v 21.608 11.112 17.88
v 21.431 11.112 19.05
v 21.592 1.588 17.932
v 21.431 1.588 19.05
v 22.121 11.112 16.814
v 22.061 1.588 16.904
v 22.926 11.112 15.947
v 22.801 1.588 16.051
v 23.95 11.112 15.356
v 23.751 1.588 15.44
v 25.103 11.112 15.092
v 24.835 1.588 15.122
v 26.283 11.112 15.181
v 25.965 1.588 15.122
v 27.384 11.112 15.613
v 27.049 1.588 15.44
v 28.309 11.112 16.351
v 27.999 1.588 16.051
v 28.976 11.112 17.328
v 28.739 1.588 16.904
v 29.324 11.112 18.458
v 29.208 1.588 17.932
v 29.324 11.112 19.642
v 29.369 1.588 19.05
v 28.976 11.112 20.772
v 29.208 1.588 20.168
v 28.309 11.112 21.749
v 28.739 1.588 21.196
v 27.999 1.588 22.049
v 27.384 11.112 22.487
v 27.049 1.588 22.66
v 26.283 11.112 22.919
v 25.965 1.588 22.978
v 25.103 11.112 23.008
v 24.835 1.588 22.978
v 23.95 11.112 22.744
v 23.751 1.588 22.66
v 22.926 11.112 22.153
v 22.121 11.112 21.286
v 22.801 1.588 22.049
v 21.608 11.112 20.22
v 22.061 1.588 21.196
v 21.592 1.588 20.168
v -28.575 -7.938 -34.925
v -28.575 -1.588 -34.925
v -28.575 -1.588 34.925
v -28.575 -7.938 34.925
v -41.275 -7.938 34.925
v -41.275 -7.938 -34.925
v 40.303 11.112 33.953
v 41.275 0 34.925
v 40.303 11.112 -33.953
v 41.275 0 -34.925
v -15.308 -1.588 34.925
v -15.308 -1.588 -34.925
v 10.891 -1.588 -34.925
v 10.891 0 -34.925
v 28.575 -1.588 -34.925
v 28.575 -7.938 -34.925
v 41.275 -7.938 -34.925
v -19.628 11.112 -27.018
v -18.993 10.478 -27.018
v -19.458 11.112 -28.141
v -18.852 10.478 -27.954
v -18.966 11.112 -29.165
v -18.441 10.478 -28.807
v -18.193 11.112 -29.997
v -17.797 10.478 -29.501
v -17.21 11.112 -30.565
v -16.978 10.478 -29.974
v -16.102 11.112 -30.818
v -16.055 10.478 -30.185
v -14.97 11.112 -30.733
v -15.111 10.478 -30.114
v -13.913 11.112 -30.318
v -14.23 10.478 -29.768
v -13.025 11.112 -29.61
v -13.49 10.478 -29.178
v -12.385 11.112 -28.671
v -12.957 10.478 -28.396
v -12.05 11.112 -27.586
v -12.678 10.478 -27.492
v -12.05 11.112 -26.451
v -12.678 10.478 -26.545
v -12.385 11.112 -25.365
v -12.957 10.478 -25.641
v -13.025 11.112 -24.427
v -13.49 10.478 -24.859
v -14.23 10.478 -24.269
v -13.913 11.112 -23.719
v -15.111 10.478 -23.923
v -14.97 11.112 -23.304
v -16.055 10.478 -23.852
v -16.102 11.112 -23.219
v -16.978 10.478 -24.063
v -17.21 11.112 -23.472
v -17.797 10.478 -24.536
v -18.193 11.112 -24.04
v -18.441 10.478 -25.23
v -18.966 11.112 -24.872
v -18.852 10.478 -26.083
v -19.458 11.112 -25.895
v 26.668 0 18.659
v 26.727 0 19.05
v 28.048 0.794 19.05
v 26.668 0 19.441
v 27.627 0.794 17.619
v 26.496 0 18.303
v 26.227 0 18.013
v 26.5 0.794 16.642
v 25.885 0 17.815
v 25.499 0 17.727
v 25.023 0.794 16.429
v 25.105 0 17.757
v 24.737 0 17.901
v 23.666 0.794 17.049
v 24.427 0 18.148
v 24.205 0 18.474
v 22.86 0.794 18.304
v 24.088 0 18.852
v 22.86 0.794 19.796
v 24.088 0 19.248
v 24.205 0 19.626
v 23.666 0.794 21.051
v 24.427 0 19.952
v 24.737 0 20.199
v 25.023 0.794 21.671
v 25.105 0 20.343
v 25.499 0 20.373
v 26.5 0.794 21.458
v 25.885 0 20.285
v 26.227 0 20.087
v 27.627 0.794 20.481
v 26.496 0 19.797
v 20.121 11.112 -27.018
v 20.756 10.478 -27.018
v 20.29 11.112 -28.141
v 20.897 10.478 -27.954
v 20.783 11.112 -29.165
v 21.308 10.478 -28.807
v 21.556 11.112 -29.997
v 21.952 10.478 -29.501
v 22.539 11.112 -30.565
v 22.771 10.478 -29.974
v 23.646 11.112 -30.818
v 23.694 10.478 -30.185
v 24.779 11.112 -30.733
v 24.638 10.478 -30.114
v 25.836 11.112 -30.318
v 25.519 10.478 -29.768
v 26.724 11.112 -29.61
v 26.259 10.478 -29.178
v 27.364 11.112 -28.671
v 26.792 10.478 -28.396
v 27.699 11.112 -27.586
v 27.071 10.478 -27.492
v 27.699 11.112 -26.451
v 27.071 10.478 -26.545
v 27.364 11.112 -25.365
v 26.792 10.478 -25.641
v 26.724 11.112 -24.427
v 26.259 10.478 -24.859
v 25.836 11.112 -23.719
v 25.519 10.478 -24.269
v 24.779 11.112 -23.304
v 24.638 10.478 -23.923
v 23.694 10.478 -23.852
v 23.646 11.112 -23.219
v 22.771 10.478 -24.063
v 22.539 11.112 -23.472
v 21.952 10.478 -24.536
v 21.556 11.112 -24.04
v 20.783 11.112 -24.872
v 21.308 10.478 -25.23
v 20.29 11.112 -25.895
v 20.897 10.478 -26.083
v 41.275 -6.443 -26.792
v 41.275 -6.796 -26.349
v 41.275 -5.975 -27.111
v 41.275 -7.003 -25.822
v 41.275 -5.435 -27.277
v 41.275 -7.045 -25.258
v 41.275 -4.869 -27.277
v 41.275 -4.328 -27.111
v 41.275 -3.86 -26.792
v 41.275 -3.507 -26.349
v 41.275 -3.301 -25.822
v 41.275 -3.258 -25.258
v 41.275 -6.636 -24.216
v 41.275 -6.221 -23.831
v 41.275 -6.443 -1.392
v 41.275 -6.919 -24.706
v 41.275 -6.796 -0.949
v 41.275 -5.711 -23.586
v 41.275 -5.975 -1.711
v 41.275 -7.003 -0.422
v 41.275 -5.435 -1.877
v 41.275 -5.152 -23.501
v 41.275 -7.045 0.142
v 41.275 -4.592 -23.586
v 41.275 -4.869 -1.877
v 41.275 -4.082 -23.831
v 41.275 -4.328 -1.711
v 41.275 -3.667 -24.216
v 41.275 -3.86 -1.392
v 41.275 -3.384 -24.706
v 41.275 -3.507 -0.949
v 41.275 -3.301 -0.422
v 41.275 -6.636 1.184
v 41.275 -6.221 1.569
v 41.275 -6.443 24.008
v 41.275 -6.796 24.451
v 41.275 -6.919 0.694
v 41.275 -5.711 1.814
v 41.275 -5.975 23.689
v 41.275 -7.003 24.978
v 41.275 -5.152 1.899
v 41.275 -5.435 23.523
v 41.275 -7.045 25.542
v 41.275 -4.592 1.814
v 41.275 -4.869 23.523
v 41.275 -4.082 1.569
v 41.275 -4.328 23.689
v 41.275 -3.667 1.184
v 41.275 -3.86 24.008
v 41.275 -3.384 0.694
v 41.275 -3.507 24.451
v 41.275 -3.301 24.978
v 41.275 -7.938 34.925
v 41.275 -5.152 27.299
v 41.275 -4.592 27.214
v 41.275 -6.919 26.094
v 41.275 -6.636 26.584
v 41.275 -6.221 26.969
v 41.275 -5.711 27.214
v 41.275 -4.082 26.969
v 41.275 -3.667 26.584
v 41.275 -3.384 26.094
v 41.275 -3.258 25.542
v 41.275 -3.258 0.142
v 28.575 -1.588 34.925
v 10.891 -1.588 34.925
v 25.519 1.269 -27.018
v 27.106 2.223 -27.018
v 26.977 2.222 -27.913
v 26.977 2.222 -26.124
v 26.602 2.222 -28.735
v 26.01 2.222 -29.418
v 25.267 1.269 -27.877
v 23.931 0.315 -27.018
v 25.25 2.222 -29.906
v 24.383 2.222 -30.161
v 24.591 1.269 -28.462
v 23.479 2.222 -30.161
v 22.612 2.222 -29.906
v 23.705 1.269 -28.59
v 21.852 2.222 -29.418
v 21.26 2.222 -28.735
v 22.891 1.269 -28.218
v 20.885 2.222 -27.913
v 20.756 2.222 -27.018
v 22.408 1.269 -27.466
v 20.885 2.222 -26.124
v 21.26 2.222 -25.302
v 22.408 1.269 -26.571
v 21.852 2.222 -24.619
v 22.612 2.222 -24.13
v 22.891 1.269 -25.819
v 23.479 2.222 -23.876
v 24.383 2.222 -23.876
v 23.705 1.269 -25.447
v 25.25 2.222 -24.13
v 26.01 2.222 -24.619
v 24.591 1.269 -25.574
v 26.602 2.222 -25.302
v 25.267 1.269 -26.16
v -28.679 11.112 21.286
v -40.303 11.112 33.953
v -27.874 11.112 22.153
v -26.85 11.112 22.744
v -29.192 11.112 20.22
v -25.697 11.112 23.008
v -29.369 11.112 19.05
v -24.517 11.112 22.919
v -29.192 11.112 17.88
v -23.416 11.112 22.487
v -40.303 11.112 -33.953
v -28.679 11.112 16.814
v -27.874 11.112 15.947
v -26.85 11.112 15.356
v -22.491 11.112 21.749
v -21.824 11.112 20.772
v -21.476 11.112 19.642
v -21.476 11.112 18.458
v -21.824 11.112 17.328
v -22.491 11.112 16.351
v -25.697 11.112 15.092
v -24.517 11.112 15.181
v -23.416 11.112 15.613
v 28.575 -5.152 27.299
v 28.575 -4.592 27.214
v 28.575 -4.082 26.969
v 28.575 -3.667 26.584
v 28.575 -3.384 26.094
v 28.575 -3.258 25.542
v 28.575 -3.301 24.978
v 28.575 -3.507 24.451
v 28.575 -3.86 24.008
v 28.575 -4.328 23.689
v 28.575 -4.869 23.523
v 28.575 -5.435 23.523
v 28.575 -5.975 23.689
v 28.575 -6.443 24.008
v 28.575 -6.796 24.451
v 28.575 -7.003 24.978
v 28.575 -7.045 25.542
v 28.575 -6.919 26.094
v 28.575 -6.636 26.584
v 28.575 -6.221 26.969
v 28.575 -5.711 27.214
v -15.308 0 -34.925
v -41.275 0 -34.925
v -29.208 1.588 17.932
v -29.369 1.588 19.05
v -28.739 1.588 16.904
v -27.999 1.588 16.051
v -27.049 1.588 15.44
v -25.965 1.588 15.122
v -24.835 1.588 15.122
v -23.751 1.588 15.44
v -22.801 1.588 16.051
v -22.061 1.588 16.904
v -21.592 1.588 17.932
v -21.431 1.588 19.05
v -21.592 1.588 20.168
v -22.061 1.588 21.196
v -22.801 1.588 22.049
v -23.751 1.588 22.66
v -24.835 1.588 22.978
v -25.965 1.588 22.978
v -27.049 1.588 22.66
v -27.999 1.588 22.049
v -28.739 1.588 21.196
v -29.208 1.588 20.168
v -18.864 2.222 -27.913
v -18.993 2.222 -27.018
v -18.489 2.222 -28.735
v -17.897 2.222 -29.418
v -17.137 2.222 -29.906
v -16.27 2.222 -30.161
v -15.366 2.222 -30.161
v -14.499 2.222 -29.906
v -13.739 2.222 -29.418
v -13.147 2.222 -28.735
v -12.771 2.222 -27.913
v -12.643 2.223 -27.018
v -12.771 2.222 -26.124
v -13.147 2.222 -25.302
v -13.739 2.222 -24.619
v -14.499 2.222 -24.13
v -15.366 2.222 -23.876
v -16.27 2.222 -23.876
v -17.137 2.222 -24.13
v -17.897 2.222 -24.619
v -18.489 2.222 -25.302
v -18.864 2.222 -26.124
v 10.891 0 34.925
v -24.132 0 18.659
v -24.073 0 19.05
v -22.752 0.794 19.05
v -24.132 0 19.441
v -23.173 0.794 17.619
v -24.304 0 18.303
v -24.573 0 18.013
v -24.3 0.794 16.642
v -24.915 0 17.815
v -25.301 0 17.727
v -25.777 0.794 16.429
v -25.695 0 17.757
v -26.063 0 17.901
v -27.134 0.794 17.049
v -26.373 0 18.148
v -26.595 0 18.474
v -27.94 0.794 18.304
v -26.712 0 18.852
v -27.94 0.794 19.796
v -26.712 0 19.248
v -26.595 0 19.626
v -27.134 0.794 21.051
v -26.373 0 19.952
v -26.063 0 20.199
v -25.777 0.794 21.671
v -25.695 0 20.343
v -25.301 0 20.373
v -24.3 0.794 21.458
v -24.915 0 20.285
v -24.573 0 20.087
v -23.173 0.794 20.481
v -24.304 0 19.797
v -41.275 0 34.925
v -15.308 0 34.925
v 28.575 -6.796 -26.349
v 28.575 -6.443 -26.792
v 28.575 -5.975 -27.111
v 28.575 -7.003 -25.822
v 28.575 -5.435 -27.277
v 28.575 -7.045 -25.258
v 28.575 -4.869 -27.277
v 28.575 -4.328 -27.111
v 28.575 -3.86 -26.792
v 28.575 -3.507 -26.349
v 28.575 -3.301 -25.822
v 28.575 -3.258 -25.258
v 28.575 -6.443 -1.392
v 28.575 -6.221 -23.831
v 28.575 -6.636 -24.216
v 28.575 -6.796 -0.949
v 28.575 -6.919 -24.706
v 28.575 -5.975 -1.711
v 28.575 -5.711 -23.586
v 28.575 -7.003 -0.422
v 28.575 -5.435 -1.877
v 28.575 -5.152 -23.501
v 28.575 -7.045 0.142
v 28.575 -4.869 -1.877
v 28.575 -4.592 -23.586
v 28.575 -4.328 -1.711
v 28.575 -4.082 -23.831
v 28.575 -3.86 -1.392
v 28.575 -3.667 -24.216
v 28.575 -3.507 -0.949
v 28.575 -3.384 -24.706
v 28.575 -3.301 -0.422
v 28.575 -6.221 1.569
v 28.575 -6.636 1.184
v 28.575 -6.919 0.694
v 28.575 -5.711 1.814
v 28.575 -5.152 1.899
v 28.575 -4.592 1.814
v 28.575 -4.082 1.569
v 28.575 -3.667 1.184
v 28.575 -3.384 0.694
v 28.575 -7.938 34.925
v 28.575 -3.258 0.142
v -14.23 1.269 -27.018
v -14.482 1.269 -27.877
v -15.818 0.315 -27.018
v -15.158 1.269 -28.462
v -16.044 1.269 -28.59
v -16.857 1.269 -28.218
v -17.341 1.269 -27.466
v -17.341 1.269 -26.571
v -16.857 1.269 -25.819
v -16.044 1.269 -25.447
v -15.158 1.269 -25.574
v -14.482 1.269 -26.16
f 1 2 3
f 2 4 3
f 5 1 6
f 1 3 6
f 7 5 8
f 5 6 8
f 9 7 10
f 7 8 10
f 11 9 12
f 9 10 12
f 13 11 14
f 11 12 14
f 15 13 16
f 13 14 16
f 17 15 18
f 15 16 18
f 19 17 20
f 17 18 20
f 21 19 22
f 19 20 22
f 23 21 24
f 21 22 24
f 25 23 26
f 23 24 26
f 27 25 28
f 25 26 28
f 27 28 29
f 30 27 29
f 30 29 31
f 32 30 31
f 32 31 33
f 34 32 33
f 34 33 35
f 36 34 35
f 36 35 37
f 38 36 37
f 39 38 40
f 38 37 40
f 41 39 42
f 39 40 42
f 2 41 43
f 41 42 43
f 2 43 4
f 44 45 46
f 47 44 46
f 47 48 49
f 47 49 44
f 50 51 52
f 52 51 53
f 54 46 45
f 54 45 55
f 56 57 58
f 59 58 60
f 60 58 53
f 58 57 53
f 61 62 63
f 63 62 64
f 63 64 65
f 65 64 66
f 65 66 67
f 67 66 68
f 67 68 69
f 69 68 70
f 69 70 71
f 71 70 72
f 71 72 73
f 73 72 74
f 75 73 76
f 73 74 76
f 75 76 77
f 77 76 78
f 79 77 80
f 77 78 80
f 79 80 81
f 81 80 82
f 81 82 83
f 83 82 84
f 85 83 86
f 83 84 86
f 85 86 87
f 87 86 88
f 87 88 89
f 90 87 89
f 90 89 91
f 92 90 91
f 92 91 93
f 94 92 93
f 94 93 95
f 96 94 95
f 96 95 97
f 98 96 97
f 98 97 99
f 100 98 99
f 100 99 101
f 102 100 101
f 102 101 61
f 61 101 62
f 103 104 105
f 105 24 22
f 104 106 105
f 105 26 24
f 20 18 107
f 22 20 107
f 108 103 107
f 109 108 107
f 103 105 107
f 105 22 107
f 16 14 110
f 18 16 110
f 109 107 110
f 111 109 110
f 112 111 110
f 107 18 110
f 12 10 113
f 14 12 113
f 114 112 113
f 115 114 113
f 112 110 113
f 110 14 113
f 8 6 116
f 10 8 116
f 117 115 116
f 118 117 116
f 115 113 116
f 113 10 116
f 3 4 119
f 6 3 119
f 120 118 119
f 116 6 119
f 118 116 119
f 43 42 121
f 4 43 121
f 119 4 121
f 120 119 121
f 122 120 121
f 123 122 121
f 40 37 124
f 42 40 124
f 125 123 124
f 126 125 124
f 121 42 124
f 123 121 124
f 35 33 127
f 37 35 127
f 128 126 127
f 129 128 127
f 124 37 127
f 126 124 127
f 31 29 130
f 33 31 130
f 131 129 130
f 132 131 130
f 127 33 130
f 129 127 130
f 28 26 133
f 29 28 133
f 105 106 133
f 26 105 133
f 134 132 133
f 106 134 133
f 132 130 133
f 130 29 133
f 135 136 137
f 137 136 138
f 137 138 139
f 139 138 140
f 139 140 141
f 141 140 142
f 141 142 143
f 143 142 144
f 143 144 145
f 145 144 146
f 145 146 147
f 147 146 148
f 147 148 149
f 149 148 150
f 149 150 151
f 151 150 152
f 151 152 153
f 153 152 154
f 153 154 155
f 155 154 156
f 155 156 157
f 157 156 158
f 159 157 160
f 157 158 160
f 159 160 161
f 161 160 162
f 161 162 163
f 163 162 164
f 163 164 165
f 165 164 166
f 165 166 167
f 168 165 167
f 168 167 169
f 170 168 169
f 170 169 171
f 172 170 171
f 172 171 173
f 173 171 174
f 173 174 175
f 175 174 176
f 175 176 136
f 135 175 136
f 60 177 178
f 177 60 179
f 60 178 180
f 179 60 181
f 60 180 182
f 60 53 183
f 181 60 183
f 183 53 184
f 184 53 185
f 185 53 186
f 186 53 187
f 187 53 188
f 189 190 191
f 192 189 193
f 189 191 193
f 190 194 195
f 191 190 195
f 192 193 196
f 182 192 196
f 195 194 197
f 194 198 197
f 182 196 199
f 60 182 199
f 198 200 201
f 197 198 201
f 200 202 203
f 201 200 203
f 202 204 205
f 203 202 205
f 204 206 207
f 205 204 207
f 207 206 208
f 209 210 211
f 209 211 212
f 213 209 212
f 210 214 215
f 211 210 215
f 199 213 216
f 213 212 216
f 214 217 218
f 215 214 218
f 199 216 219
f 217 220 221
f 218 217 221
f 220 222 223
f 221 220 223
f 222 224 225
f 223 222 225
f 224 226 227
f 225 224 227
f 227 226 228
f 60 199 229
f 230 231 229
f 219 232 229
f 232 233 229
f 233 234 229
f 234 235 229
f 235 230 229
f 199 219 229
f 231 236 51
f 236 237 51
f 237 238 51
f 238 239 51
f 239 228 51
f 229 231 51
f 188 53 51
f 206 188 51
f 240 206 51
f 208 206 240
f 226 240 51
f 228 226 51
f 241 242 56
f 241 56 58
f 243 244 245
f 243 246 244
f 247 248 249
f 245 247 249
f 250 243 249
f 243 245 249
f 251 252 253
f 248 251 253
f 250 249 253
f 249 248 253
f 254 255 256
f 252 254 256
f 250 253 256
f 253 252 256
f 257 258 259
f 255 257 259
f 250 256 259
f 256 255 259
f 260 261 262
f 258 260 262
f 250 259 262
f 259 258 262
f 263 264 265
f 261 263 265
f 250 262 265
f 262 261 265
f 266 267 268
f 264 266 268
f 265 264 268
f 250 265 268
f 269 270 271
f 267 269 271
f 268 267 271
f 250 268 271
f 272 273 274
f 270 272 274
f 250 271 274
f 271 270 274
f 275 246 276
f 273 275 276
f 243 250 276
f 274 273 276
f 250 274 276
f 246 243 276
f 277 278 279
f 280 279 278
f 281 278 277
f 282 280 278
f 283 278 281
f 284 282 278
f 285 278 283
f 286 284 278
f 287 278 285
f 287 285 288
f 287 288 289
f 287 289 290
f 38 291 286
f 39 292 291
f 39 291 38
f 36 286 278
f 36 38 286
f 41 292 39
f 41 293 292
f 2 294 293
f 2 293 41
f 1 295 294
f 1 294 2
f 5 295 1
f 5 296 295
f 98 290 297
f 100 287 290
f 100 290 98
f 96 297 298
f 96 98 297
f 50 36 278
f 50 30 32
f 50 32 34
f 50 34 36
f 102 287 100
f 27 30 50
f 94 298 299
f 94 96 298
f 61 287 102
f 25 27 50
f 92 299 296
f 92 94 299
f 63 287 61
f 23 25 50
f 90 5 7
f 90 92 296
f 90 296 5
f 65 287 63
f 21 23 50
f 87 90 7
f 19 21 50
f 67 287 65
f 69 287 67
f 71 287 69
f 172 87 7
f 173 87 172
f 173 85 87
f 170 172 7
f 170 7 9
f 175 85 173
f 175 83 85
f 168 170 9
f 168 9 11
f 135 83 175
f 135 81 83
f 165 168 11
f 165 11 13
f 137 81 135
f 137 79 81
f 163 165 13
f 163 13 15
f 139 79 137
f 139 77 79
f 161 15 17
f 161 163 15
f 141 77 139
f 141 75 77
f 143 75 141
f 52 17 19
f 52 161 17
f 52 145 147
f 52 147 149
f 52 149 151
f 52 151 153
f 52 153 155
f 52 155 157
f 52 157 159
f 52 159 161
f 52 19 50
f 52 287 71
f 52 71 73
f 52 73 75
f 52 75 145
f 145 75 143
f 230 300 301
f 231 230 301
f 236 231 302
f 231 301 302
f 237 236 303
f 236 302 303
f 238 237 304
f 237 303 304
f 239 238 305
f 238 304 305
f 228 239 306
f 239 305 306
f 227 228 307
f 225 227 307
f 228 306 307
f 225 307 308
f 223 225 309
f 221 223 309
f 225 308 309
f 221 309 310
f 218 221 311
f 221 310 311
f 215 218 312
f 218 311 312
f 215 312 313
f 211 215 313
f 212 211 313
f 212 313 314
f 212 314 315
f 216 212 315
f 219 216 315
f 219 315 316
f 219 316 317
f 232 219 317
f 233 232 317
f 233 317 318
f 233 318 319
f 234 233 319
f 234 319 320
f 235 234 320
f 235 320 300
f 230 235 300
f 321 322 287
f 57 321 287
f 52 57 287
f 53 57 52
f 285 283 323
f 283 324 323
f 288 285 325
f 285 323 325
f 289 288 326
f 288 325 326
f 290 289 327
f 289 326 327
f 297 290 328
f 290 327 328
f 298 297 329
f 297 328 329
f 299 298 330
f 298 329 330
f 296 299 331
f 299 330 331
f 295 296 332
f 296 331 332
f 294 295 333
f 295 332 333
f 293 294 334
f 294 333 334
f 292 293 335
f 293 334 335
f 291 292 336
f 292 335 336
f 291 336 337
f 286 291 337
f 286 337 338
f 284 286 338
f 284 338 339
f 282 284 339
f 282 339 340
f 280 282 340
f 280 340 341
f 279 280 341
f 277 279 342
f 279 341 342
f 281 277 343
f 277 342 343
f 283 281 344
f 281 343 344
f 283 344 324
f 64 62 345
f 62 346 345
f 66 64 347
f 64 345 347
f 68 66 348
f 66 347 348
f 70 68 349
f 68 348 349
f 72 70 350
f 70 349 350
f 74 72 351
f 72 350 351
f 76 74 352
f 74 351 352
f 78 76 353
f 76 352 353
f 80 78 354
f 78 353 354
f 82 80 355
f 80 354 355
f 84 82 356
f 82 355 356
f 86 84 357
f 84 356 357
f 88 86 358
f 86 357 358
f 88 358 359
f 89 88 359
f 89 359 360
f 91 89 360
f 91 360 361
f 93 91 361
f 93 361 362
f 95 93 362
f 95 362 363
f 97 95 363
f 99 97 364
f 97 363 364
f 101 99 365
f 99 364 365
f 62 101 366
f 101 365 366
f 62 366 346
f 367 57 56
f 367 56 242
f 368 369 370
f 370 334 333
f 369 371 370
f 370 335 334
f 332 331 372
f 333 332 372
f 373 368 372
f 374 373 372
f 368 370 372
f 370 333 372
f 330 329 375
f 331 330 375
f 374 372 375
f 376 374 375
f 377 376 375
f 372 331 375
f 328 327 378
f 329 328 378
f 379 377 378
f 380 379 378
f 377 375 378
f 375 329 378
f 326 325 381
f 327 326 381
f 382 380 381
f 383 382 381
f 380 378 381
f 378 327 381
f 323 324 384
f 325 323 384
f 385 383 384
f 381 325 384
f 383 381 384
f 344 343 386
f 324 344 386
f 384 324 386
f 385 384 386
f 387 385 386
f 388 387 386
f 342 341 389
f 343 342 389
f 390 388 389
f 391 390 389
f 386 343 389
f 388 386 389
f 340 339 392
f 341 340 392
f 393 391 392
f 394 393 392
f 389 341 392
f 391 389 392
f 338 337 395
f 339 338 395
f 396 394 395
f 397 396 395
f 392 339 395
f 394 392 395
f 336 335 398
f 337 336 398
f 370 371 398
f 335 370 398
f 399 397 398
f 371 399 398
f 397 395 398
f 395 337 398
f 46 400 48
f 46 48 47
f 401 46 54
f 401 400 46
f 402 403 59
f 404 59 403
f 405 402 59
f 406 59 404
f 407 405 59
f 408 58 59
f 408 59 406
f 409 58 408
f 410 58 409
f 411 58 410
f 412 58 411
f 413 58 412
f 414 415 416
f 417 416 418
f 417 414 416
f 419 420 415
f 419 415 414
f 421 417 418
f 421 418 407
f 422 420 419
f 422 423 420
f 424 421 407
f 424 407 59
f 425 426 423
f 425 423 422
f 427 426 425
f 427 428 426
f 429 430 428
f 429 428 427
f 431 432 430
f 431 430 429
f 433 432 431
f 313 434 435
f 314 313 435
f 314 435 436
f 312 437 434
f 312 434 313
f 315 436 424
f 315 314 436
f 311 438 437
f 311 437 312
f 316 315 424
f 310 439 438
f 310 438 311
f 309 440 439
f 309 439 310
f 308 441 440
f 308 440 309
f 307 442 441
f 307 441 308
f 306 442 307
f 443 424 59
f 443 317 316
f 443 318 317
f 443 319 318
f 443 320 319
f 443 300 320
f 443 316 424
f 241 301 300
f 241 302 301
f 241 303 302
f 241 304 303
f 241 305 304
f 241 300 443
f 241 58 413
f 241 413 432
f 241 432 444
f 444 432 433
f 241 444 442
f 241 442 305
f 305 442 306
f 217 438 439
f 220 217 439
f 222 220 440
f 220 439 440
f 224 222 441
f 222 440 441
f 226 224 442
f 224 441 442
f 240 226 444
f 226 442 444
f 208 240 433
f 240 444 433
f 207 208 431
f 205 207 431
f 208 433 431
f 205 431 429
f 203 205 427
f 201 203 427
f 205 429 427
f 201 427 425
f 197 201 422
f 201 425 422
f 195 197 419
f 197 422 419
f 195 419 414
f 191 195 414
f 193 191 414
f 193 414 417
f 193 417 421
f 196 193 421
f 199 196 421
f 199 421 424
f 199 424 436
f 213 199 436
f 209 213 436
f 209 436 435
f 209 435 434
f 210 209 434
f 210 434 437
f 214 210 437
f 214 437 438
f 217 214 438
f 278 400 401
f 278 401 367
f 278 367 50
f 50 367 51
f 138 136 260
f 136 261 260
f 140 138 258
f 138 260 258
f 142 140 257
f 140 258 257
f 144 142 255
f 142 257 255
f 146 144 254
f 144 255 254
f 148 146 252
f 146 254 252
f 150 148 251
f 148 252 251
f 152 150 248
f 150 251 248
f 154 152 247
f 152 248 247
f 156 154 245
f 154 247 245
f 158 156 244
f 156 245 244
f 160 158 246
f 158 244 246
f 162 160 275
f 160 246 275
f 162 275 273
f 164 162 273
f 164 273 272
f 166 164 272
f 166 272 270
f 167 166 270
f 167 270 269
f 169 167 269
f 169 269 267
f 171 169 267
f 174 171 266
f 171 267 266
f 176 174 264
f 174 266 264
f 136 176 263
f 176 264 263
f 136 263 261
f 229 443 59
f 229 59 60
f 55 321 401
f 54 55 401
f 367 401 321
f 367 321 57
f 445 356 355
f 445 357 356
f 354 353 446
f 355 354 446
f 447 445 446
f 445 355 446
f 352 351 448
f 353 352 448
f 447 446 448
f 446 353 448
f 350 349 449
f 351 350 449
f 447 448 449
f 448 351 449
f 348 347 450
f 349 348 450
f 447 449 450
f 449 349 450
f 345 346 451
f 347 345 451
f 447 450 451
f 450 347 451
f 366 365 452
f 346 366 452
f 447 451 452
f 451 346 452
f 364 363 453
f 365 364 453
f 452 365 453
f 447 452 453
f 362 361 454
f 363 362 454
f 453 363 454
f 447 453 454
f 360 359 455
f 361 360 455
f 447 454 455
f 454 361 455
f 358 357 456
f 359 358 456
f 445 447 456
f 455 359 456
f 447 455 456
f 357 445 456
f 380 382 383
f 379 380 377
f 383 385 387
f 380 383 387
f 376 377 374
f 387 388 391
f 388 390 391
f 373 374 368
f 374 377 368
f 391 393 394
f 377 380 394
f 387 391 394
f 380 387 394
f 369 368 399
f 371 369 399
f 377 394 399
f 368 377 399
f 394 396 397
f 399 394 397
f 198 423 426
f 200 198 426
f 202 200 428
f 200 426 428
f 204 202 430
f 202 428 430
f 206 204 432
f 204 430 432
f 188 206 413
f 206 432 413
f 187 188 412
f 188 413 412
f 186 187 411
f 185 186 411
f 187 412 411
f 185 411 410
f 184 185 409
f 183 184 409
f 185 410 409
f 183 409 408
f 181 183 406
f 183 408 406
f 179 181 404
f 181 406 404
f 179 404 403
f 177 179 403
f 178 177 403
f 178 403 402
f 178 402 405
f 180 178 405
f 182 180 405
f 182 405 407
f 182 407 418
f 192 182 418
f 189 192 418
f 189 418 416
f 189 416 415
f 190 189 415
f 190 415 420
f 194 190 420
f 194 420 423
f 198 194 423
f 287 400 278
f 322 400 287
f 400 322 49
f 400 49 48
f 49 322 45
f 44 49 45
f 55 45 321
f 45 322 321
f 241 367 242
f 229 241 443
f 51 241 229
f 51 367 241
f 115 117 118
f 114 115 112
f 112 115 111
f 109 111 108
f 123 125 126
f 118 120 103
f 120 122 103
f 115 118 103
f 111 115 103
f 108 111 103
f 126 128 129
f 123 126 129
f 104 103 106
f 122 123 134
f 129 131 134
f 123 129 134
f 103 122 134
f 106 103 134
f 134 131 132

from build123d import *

# Parameters (mm, degrees)
SKETCH1_W                             = 82.55
SKETCH1_H                             = 69.85
BOSS_EXTRUDE1_DEPTH                   = 7.9375
SKETCH2_W                             = 82.55
SKETCH2_H                             = 69.85
BOSS_EXTRUDE2_DEPTH                   = 3.175
F_3_8_16_TAPPED_HOLE1_D               = 7.9375
F_3_8_16_TAPPED_HOLE1_DEPTH           = 9.525
F_3_8_16_TAPPED_HOLE1_TIP             = 2.384665582
DRAFT1_ANGLE                          = 5
SKETCH3_W                             = 12.7
SKETCH3_H                             = 69.85
BOSS_EXTRUDE3_DEPTH                   = 7.9375
SKETCH4_W                             = 13.267261336
SKETCH4_H                             = 69.85
SKETCH4_W_2                           = 17.684109612
WEAR_PADS_DEPTH                       = 1.5875
F_10_24_TAPPED_HOLE1_D                = 3.7973
F_10_24_TAPPED_HOLE1_DEPTH            = 12.7
F_1_4_0_25_DIAMETER_HOLE1_D           = 6.35
F_1_4_0_25_DIAMETER_HOLE1_DEPTH       = 8.89
F_1_4_0_25_DIAMETER_HOLE1_CSINK_D     = 7.62
F_1_4_0_25_DIAMETER_HOLE1_CSINK_ANGLE = 90
F_1_4_0_25_DIAMETER_HOLE1_TIP         = 1.907732465


with BuildPart() as part:
    # Sketch1 → Boss-Extrude1 (new body)
    with BuildSketch(Plane(origin=(0, 0, 0), x_dir=(1, 0, 0), z_dir=(0, 1, 0))):
        Rectangle(SKETCH1_W, SKETCH1_H)
    extrude(amount=BOSS_EXTRUDE1_DEPTH)

    # Sketch2 → Boss-Extrude2 (add)
    with BuildSketch(Plane(origin=(0, 7.9375, 0), x_dir=(1, 0, 0), z_dir=(0, 1, 0))):
        Rectangle(SKETCH2_W, SKETCH2_H)
    extrude(amount=BOSS_EXTRUDE2_DEPTH)

    # 3/8-16 Tapped Hole1
    with Locations(Plane(origin=(0, 11.1125, 0), x_dir=(1, 0, 0), z_dir=(0, 1, 0))):
        with Locations((-25.4, -19.05), (25.4, -19.05)):
            Hole(F_3_8_16_TAPPED_HOLE1_D / 2, depth=F_3_8_16_TAPPED_HOLE1_DEPTH)
            with Locations((0, 0, -(F_3_8_16_TAPPED_HOLE1_DEPTH + F_3_8_16_TAPPED_HOLE1_TIP / 2))):  # 118° drill point
                Cone(0, F_3_8_16_TAPPED_HOLE1_D / 2, F_3_8_16_TAPPED_HOLE1_TIP, mode=Mode.SUBTRACT)

    # Draft1
    draft1_faces = [part.faces().sort_by_distance(p)[0] for p in [
        (0, 5.55625, -34.925),
        (-41.275, 5.55625, 0),
        (0, 5.55625, 34.925),
        (41.275, 5.55625, 0),
    ]]
    draft(draft1_faces, Plane.ZX, DRAFT1_ANGLE)

    # Sketch3 → Boss-Extrude3 (add)
    with BuildSketch(Plane.XZ):
        with Locations((34.925, 0)):
            Rectangle(SKETCH3_W, SKETCH3_H)
        with Locations((-34.925, 0)):
            Rectangle(SKETCH3_W, SKETCH3_H)
    extrude(amount=BOSS_EXTRUDE3_DEPTH)

    # Sketch4 → Wear Pads (add)
    with BuildSketch(Plane.XZ):
        with Locations((-21.941369332, 0)):
            Rectangle(SKETCH4_W, SKETCH4_H)
        with Locations((19.732945194, 0)):
            Rectangle(SKETCH4_W_2, SKETCH4_H)
    extrude(amount=WEAR_PADS_DEPTH)

    # #10-24 Tapped Hole1
    with Locations(Plane(origin=(41.275, 0, 0), x_dir=(0, 0, -1), z_dir=(1, 0, 0))):
        with Locations((-25.4, -5.151627132), (25.4, -5.151627132), (0, -5.151627132)):
            Hole(F_10_24_TAPPED_HOLE1_D / 2, depth=F_10_24_TAPPED_HOLE1_DEPTH)

    # 1/4 (0.25) Diameter Hole1
    with Locations(Plane(origin=(0, 11.1125, 0), x_dir=(1, 0, 0), z_dir=(0, 1, 0))):
        with Locations((-15.817703685, 27.018390392), (23.931088267, 27.018390392)):
            CounterSinkHole(F_1_4_0_25_DIAMETER_HOLE1_D / 2, F_1_4_0_25_DIAMETER_HOLE1_CSINK_D / 2, depth=F_1_4_0_25_DIAMETER_HOLE1_DEPTH, counter_sink_angle=F_1_4_0_25_DIAMETER_HOLE1_CSINK_ANGLE)
            with Locations((0, 0, -(F_1_4_0_25_DIAMETER_HOLE1_DEPTH + F_1_4_0_25_DIAMETER_HOLE1_TIP / 2))):  # 118° drill point
                Cone(0, F_1_4_0_25_DIAMETER_HOLE1_D / 2, F_1_4_0_25_DIAMETER_HOLE1_TIP, mode=Mode.SUBTRACT)


solid = part.part
